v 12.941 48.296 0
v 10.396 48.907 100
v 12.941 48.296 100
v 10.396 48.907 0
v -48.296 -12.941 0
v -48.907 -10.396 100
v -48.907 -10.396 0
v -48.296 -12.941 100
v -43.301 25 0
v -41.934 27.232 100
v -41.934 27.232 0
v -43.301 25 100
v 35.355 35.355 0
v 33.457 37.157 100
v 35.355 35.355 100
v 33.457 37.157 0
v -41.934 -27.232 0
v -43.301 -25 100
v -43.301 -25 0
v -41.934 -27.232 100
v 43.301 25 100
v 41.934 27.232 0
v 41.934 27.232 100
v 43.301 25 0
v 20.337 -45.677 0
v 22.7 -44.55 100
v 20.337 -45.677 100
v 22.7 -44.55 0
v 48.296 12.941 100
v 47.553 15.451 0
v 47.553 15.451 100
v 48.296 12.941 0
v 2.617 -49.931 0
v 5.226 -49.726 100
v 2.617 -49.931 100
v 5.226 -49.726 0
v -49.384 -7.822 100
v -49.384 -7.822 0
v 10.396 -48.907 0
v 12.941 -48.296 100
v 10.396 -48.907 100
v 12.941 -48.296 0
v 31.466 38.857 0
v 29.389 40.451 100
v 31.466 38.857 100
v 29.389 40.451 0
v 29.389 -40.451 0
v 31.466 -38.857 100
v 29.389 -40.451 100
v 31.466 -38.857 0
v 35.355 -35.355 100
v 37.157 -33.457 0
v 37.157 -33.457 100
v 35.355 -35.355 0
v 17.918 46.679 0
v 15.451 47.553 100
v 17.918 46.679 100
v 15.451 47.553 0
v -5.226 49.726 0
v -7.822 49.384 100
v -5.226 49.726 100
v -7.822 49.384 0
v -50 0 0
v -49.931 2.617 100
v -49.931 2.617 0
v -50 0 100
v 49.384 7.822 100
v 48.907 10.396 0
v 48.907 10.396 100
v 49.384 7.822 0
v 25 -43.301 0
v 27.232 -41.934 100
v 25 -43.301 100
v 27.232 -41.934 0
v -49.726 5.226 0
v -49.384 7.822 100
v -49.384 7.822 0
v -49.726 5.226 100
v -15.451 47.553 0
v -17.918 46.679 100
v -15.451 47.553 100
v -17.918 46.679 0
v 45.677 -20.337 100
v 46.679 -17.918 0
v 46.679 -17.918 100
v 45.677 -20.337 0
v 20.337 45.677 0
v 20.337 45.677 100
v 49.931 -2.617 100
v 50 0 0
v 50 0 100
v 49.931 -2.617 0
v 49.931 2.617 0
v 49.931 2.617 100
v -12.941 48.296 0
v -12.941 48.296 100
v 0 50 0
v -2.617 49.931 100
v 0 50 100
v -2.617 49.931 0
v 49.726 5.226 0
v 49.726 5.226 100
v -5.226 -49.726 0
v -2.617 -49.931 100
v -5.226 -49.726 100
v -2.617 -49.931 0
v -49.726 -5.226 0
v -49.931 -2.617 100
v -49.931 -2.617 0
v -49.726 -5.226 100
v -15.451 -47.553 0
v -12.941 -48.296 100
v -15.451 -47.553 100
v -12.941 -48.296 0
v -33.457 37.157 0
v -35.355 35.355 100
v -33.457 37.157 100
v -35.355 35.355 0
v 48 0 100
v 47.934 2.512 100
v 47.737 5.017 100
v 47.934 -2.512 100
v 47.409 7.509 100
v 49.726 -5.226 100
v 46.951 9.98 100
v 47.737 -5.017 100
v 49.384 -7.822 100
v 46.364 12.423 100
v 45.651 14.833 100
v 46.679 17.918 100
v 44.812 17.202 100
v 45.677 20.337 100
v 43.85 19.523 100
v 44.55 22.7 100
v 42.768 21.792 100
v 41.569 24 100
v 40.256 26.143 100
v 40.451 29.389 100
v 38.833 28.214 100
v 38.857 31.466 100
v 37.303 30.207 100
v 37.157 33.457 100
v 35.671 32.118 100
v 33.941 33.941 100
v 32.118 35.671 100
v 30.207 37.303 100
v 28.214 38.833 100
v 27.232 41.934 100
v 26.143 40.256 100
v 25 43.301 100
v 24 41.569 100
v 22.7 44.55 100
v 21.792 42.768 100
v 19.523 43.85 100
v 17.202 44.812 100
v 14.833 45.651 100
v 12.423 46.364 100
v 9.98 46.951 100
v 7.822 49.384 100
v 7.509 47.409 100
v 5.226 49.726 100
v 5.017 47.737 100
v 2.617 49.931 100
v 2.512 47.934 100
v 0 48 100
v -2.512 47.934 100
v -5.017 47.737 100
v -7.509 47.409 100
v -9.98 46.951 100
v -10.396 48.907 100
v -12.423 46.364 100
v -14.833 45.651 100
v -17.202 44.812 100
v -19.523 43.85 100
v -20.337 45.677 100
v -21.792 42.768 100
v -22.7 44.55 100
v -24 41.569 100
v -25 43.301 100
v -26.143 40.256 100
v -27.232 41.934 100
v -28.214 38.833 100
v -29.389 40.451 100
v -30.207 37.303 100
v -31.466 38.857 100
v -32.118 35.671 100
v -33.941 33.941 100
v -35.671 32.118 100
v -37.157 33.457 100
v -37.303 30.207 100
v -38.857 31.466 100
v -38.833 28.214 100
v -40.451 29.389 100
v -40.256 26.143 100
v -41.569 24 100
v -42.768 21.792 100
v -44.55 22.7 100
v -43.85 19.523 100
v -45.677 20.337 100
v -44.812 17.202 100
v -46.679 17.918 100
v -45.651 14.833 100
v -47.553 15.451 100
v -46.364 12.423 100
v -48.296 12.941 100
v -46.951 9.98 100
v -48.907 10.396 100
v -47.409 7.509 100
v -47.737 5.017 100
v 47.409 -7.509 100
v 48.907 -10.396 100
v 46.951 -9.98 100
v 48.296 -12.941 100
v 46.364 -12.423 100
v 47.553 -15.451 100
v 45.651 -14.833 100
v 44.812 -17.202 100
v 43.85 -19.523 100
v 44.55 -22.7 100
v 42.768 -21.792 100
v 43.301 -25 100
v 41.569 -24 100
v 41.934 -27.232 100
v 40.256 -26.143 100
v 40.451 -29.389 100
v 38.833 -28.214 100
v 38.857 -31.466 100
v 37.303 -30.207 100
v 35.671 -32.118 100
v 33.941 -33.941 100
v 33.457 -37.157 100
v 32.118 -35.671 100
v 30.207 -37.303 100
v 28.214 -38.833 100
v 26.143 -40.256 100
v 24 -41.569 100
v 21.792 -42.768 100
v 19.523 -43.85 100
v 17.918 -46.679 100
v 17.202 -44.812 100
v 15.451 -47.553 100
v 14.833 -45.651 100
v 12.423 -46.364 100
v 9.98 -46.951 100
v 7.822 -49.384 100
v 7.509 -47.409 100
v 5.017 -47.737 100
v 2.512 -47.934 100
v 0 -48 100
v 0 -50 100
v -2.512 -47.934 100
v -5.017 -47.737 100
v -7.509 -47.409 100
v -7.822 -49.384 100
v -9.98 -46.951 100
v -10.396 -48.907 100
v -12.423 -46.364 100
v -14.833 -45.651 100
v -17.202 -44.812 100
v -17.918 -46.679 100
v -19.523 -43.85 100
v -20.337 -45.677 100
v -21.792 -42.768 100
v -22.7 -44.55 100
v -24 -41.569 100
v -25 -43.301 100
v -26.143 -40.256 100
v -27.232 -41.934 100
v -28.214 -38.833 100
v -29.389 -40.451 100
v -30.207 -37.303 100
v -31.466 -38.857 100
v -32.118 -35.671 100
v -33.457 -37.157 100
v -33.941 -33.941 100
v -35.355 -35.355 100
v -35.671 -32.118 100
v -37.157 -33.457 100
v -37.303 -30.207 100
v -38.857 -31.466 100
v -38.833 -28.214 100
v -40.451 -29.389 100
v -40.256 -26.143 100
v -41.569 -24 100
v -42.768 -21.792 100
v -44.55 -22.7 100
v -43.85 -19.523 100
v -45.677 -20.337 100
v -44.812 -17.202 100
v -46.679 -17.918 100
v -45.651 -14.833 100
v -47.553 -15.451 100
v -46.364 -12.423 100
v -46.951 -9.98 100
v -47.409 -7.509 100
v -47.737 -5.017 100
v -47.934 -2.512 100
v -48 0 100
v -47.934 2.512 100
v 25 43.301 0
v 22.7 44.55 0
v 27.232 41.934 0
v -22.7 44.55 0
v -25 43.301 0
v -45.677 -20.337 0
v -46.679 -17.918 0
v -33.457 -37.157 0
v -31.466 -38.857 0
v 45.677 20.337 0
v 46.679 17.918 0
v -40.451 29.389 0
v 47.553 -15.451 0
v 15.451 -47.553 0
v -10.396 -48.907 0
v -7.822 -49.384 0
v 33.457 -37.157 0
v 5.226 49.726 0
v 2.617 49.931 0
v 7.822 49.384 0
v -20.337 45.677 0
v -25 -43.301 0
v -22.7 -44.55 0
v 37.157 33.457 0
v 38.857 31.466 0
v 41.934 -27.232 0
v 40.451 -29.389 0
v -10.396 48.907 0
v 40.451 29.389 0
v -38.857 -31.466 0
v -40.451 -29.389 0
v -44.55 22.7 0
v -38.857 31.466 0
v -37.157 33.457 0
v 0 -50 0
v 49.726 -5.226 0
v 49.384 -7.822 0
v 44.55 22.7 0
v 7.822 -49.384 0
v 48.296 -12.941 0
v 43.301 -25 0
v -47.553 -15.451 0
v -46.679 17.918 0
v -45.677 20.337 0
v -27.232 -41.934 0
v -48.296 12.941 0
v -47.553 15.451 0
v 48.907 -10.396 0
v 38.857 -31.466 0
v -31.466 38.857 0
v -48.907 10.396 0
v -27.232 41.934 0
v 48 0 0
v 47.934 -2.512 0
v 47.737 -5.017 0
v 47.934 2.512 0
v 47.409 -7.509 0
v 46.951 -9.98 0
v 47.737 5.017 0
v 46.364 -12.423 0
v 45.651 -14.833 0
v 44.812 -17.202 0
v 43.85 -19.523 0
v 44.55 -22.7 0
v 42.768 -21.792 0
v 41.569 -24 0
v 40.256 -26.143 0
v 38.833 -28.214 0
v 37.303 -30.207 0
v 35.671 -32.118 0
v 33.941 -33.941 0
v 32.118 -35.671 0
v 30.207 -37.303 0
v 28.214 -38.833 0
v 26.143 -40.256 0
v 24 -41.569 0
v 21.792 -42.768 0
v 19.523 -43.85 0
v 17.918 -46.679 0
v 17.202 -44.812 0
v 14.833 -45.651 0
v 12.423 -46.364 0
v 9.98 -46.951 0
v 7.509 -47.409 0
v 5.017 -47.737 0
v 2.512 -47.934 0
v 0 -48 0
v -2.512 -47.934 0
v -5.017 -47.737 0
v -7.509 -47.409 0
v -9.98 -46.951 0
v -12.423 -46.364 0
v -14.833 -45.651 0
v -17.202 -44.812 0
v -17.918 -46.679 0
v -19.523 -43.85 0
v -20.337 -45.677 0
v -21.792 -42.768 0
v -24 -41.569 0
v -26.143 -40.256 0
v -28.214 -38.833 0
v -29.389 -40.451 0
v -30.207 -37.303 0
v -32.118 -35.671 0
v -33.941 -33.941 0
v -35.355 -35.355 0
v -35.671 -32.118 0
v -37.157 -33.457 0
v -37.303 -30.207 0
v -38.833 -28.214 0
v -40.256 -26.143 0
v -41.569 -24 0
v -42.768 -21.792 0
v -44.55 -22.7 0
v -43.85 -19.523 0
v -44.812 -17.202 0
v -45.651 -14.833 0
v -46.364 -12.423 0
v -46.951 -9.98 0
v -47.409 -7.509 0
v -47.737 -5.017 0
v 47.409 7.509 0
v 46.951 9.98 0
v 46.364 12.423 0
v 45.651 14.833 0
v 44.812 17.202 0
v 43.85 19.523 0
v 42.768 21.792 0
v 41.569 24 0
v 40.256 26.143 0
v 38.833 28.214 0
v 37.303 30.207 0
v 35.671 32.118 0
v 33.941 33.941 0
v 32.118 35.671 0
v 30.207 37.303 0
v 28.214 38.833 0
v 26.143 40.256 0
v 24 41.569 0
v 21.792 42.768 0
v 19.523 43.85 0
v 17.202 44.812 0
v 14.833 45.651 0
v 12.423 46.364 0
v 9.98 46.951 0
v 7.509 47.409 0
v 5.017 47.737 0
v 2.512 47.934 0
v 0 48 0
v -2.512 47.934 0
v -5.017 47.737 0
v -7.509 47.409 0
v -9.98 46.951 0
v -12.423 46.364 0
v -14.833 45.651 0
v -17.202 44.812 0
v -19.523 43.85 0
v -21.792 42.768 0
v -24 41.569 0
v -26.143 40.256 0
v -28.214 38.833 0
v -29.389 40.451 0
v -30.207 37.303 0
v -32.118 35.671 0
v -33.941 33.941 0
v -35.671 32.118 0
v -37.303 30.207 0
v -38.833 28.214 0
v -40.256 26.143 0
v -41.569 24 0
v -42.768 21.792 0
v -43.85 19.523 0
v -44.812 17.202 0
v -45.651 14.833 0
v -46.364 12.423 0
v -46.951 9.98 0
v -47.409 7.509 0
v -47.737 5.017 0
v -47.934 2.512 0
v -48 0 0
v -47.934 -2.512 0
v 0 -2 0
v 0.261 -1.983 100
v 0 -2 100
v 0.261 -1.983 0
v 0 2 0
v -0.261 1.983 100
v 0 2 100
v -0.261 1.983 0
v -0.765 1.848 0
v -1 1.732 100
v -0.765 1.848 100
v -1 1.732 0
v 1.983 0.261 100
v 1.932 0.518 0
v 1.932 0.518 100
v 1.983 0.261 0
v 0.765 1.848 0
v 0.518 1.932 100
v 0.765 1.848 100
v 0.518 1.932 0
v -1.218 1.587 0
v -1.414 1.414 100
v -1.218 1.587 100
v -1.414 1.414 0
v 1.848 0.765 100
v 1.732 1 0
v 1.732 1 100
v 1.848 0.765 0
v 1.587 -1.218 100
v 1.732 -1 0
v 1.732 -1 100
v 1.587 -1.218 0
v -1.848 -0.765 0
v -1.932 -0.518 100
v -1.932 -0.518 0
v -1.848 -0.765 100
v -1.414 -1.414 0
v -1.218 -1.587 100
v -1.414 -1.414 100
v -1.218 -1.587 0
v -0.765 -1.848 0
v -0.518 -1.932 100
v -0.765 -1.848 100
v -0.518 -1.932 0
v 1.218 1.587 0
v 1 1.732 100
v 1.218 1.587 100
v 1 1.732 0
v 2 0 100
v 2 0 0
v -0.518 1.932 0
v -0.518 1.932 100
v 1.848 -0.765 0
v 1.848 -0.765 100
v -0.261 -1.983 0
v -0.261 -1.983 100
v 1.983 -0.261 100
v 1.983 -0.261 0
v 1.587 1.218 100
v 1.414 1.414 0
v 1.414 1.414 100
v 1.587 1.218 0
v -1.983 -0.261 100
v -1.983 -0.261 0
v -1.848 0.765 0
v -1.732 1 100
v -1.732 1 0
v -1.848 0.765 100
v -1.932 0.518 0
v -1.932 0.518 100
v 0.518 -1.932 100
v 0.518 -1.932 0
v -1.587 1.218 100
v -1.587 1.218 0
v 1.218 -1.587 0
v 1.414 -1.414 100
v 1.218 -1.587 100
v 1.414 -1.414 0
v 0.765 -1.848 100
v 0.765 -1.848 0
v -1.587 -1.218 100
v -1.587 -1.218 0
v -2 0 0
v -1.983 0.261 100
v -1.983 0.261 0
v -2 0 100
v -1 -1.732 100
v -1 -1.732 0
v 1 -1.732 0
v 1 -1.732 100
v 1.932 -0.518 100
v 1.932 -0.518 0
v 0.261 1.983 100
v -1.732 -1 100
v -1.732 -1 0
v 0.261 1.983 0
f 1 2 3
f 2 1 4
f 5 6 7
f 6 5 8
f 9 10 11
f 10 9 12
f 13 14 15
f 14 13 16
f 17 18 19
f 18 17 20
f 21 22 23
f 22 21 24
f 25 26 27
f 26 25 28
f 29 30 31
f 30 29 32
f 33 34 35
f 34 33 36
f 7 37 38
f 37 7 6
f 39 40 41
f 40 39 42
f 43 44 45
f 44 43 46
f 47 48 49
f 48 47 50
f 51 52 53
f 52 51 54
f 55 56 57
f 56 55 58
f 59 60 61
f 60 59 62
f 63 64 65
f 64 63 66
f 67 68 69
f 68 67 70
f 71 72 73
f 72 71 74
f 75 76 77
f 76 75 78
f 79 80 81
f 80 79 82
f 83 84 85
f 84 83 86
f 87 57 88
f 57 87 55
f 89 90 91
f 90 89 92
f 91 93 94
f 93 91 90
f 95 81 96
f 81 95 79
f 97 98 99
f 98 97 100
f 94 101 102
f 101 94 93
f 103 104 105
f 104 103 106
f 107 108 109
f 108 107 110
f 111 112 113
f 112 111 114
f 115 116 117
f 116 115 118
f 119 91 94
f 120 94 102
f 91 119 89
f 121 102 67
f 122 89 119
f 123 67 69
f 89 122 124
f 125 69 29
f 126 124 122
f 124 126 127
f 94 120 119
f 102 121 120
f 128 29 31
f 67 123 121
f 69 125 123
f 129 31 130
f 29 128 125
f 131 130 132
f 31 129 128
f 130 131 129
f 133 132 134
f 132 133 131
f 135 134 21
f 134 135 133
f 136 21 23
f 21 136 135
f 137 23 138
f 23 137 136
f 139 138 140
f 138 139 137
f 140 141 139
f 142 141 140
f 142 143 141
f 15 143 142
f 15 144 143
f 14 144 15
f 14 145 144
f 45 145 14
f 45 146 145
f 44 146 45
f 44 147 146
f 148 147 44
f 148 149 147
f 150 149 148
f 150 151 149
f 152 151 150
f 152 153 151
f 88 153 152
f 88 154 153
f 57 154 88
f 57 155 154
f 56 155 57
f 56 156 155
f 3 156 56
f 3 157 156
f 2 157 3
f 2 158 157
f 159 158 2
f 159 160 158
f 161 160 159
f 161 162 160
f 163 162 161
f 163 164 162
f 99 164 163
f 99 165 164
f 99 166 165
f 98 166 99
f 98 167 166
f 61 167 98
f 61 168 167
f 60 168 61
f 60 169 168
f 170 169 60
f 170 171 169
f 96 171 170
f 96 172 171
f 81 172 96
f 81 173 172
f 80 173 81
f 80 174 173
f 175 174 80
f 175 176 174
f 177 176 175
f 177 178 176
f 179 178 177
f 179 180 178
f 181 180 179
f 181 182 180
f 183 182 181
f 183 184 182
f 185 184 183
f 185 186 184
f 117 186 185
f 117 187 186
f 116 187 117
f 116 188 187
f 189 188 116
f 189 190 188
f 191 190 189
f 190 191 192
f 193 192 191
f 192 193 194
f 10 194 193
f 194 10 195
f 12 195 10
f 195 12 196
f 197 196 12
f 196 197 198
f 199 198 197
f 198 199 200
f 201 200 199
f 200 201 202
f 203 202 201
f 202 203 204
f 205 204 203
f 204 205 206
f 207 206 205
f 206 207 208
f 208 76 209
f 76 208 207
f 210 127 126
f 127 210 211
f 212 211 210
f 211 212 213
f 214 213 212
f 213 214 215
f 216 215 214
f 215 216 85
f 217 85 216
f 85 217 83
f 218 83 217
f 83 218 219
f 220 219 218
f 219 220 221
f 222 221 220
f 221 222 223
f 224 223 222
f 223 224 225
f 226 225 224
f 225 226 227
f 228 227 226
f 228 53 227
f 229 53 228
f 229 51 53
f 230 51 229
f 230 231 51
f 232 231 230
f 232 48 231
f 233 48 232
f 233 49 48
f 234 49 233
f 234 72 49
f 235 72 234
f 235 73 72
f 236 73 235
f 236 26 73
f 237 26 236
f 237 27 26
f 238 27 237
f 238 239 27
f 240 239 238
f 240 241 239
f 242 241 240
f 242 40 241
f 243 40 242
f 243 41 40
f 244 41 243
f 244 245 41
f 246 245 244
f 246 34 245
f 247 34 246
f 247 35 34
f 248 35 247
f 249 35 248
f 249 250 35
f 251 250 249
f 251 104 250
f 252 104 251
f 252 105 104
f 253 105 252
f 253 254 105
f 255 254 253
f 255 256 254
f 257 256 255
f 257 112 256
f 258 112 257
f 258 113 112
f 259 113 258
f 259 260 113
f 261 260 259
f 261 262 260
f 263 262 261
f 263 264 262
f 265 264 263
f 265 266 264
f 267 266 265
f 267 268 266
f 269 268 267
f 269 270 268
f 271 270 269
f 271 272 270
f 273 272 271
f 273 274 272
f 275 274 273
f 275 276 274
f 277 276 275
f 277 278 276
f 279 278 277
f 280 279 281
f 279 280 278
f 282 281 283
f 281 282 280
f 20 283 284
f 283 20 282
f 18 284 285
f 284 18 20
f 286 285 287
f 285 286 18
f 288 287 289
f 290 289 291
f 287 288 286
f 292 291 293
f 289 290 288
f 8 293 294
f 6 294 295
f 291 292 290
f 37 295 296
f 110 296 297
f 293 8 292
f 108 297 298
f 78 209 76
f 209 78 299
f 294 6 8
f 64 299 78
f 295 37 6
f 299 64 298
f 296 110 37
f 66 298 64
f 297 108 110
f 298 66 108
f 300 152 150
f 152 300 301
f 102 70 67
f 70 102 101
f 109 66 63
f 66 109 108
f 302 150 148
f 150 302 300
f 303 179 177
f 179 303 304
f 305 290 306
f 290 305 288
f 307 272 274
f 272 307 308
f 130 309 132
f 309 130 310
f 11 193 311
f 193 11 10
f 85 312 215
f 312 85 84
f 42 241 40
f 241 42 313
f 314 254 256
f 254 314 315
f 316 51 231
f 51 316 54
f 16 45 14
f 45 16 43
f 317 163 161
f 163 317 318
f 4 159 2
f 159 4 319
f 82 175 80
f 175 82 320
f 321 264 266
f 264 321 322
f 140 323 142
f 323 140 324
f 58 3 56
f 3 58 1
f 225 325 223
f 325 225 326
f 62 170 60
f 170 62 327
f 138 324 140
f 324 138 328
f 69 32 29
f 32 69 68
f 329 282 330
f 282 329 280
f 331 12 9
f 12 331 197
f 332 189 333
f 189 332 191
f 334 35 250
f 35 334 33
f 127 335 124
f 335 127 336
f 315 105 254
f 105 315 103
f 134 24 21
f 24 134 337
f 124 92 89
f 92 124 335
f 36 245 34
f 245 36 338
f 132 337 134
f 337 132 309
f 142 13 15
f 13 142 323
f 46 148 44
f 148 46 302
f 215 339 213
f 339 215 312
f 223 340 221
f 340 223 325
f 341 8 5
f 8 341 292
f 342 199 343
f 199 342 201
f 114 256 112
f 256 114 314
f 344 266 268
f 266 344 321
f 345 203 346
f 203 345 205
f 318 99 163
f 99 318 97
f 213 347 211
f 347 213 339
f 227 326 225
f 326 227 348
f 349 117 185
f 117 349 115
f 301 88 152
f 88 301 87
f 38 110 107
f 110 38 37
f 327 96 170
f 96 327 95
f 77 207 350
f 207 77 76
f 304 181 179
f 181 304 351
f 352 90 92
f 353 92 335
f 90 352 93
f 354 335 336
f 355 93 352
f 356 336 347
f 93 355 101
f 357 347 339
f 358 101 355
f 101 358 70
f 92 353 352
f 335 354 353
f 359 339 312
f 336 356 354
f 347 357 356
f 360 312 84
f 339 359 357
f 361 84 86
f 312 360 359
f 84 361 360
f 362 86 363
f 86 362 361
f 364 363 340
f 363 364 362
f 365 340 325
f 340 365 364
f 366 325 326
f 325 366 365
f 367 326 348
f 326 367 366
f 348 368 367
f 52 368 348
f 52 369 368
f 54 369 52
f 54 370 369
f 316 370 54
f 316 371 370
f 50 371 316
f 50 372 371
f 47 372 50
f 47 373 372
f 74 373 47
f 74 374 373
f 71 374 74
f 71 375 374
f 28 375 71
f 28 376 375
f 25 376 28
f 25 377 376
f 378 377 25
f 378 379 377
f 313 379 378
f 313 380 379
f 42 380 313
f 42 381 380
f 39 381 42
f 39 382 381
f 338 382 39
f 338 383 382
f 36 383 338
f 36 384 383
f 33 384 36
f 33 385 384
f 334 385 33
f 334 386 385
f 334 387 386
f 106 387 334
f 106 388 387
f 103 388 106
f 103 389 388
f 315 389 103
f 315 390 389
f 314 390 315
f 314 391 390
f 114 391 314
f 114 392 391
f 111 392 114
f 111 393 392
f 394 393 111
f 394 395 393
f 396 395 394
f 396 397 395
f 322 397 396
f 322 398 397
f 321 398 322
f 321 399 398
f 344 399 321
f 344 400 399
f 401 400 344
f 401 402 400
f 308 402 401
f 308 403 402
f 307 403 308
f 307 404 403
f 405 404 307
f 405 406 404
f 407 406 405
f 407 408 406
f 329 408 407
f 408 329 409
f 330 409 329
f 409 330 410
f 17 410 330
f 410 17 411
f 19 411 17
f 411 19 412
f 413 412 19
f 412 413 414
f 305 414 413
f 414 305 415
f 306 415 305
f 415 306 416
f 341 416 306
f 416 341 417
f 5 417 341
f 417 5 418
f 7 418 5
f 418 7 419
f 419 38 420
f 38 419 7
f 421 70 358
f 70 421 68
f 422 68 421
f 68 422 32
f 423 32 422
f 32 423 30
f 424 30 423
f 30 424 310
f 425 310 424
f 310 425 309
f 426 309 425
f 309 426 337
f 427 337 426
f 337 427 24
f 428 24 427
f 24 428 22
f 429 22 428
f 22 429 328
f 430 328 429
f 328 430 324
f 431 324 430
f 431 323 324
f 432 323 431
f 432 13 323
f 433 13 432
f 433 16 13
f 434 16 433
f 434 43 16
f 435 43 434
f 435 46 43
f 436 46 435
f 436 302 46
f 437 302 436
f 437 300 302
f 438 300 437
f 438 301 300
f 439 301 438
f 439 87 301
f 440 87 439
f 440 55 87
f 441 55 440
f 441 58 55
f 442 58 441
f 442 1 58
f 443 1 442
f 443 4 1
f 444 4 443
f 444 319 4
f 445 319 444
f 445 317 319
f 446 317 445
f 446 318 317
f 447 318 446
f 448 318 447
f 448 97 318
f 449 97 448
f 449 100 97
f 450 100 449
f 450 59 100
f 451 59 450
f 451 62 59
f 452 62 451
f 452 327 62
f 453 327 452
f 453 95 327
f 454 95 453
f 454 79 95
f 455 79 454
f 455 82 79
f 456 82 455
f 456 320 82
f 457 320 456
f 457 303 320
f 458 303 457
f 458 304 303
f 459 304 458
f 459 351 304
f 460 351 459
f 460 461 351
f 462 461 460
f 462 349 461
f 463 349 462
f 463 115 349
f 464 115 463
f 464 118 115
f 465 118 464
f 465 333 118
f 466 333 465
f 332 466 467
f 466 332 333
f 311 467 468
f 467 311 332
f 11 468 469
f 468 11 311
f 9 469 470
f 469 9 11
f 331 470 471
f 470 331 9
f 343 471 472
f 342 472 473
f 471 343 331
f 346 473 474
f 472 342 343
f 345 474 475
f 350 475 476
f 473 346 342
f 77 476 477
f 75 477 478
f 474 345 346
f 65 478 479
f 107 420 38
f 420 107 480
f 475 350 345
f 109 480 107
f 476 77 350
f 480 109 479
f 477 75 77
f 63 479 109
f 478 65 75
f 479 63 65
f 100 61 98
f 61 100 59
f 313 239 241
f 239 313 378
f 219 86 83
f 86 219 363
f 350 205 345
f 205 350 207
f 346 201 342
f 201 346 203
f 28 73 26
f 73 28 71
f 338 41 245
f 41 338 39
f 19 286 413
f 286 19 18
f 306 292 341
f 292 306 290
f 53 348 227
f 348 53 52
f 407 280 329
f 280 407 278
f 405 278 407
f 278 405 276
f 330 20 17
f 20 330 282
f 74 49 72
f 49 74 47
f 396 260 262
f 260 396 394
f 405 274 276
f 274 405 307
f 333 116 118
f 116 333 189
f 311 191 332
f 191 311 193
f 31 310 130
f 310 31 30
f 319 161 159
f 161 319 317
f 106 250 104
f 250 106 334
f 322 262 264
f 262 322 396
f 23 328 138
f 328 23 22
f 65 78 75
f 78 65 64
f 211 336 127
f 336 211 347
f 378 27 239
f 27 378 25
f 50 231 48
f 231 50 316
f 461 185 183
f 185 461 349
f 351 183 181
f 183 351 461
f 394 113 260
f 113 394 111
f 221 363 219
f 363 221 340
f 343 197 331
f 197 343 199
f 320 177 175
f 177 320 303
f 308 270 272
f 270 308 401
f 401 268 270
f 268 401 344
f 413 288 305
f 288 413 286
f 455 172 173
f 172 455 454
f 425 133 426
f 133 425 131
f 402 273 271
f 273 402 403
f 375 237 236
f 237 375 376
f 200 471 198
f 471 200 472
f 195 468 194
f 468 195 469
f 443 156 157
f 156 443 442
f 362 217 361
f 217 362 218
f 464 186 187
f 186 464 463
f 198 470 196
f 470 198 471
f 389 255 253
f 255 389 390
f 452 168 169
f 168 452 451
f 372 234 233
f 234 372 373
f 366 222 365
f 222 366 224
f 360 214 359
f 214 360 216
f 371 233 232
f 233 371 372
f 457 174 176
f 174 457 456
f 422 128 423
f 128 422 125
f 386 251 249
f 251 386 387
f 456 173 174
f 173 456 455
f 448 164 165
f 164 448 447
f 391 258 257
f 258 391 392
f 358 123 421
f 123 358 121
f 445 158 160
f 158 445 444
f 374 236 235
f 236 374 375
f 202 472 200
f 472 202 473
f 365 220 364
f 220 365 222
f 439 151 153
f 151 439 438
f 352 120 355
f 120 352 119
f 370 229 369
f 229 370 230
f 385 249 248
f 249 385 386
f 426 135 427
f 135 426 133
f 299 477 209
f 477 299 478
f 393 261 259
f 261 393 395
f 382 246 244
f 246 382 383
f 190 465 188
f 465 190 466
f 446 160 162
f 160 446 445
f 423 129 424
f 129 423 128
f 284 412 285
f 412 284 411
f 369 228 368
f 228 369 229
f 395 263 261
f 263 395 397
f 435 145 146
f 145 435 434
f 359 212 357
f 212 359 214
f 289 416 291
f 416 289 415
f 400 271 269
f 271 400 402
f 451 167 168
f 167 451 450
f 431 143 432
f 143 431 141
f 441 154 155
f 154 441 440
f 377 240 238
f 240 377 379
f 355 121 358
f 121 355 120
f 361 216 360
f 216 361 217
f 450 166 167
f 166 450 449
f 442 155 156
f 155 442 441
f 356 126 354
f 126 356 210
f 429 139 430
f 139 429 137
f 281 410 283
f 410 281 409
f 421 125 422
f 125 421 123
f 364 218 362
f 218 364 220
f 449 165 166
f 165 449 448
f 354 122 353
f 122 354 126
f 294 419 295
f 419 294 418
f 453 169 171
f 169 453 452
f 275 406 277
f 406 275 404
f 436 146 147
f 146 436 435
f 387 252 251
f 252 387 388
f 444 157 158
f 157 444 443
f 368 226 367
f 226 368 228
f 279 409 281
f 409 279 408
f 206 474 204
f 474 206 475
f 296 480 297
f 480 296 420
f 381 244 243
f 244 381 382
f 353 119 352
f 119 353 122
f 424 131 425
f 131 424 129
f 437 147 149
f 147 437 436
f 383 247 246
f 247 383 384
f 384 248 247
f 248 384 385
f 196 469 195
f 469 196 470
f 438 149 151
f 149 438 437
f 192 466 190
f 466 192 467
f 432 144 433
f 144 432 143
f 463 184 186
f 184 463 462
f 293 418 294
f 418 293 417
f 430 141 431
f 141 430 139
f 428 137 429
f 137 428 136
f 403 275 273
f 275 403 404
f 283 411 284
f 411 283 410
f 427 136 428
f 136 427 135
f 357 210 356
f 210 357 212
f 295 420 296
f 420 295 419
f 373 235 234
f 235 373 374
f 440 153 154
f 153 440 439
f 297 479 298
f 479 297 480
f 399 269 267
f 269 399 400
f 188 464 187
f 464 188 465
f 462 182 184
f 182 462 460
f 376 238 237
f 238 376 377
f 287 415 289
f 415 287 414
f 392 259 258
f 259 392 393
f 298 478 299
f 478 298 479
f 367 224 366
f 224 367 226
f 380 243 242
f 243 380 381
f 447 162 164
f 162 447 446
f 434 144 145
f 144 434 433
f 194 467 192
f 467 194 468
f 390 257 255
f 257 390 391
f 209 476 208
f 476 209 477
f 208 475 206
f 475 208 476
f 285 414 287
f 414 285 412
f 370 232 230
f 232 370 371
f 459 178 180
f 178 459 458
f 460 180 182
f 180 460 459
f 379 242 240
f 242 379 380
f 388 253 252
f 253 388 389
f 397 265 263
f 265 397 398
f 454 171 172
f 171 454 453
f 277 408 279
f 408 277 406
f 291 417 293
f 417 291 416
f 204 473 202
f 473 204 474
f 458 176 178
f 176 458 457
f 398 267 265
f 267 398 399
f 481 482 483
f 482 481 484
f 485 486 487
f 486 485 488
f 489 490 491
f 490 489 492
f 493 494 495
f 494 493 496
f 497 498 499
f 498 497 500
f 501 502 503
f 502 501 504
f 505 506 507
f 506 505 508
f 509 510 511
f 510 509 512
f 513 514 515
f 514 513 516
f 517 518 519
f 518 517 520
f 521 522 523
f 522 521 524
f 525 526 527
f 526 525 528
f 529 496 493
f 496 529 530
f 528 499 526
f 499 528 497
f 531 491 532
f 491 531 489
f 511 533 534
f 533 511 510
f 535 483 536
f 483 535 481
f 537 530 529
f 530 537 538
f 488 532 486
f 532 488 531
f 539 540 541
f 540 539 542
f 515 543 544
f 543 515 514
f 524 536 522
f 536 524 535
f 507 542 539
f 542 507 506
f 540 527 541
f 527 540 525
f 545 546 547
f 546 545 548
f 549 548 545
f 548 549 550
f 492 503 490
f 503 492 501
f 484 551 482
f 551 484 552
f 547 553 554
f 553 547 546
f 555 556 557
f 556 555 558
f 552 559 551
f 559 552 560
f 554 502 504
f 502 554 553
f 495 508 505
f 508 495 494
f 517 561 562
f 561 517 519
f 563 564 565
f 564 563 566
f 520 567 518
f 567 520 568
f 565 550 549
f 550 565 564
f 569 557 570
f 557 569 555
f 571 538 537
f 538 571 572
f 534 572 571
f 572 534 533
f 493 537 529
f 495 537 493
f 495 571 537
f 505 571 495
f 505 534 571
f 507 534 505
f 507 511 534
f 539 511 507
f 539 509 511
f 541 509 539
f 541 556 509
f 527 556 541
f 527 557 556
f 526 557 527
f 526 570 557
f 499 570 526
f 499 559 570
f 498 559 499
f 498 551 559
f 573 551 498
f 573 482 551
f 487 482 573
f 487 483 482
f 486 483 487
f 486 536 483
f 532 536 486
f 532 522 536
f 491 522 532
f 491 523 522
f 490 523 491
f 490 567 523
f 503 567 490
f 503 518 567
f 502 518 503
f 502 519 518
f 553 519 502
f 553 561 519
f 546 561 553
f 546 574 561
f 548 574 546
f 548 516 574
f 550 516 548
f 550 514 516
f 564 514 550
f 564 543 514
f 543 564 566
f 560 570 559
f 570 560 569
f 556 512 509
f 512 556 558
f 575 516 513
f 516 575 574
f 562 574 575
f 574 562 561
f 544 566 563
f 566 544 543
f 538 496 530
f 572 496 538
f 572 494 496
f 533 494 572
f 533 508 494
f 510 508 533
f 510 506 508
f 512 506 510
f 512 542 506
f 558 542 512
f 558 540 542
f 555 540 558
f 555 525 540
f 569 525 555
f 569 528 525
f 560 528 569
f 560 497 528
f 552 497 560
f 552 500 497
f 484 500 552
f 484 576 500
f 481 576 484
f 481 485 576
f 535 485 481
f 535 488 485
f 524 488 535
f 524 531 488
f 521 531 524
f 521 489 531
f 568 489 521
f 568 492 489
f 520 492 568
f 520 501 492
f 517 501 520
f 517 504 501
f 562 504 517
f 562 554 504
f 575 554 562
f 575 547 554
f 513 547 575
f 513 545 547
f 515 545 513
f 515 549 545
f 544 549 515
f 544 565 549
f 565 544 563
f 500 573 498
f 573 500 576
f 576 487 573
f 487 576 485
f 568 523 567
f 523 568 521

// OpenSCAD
small_fineness=48;
fineness=120;
shell=2;
width=50;
height=100;
rod=2;
inch=25.4;
blades=3;
overlap=0.1;


kerf=0.0035*inch;
thread_gap=kerf*2;

function trim(a,v,i=0,r=[])=
    i<len(a)?
        trim(a,v,i+1,concat(r,a[i][v]))
    :r;

function vlen(a,v)=2; //max(trim(a,v))-min(trim(a,v));

function augment(a,d,i=0,r=[])=
    i<len(a)?
        augment(a,d,i+1,concat(r,[concat(a[i],d)])):r;


function thread_place(thread_shape,thread_position,i=0,result=[])=(i<len(thread_shape))?thread_place(thread_shape,thread_position,i+1,concat(result,[[thread_shape[i][0]+thread_position[0],thread_shape[i][1]+thread_position[1],thread_shape[i][2]?thread_shape[i][2]+thread_position[2]:thread_position[2]]])):result;

function thread_rotate(thread_shape,angle,i=0,result=[])=
(i<len(thread_shape))?thread_rotate(thread_shape,angle,i+1,concat(result,[[cos(angle)*thread_shape[i][0],sin(angle)*thread_shape[i][0],thread_shape[i][1]]])):result;

function reverse(poly,i=0,result=[])=i<len(poly)?reverse(poly,i+1,concat(result,[poly[len(poly)-1-i]])):result;

function genpoly(thread_shape,start=0,i=0,result=[])=
    (i<len(thread_shape))?genpoly(thread_shape,start,i+1,concat(result,[i+start])):result;
    
function nextpoly(thread_shape,start=0,i=0,result=[])=
    (i<(len(thread_shape)-1))?nextpoly(thread_shape,start,i+1,concat(result,[[i+start,i+start+1,i+start+len(thread_shape)+1,i+start+len(thread_shape)]])):concat(result,[[i+start,i+start-len(thread_shape)+1,i+start+1,i+start+len(thread_shape)]]);

function capsule_thread_points(length, radius, thread_shape, thread_height,fineness, y, rot=0, result = []) = 
        let(v=thread_height)
        let(y=y?y:-v)
        let(result=(result)?result:thread_place(thread_rotate(thread_shape,rot),[cos(rot)*radius,sin(rot)*radius,y]))
    (y<(length)+v/fineness)?
    capsule_thread_points(length, radius, thread_shape, thread_height,fineness, y+v/fineness, rot+360/fineness, concat(result, thread_place(thread_rotate(thread_shape,rot+360/fineness),[cos(rot+360/fineness)*radius,sin(rot+360/fineness)*radius,y+v/fineness])))
    : result;


function capsule_thread_polys(length,thread_shape,thread_height,fineness,start,y,result=[])=
        let(v=thread_height)
        let(y=y?y:-v)
let(result=(result)?result:[reverse(genpoly(thread_shape,0))])

(y<(length+v/fineness))?capsule_thread_polys(length,thread_shape,thread_height,fineness,start,y+v/fineness,concat(result,nextpoly(thread_shape,len(result)-1)) ):concat(result,[genpoly(thread_shape,start)]);


module threads(height,radius,thread_shape,thread_width,thread_height,fineness){
    da_points=capsule_thread_points(height,radius,thread_shape,thread_height,fineness);
    da_polys=capsule_thread_polys(height,thread_shape,thread_height,fineness,len(da_points)-len(thread_shape));


    difference(){
            
        polyhedron(points=da_points,faces=da_polys);
        
            
            translate([-(radius*2+thread_width*2+0.002)/2,-(radius*2+thread_width*2+0.002)/2,-thread_height-0.001])
            cube([radius*2+thread_width*2+0.002,radius*2+thread_width*2+0.002,thread_height+0.001]);
            
            translate([-(radius*2+thread_width*2+0.002)/2,-(radius*2+thread_width*2+0.002)/2,height])
            cube([radius*2+thread_width*2+0.002,radius*2+thread_width*2+0.002,thread_height+thread_height/fineness+0.001]);
            
            
    }
}

thread_shape=[[-overlap,0],[0,0],[0,1],[width-rod-shell+overlap,1],[width-rod-shell+overlap,2],[0,2],[-overlap,2]];

for (i=[0:blades-1]){
    rotate(360/blades*i)
    threads(height,rod,thread_shape,width,100,fineness);
}

difference(){
 cylinder(height,width,width,$fn=fineness);
 translate([0,0,-0.1])
    cylinder(100.2,width-shell,width-shell,$fn=fineness);
}

cylinder(height,rod,rod,$fn=small_fineness);
